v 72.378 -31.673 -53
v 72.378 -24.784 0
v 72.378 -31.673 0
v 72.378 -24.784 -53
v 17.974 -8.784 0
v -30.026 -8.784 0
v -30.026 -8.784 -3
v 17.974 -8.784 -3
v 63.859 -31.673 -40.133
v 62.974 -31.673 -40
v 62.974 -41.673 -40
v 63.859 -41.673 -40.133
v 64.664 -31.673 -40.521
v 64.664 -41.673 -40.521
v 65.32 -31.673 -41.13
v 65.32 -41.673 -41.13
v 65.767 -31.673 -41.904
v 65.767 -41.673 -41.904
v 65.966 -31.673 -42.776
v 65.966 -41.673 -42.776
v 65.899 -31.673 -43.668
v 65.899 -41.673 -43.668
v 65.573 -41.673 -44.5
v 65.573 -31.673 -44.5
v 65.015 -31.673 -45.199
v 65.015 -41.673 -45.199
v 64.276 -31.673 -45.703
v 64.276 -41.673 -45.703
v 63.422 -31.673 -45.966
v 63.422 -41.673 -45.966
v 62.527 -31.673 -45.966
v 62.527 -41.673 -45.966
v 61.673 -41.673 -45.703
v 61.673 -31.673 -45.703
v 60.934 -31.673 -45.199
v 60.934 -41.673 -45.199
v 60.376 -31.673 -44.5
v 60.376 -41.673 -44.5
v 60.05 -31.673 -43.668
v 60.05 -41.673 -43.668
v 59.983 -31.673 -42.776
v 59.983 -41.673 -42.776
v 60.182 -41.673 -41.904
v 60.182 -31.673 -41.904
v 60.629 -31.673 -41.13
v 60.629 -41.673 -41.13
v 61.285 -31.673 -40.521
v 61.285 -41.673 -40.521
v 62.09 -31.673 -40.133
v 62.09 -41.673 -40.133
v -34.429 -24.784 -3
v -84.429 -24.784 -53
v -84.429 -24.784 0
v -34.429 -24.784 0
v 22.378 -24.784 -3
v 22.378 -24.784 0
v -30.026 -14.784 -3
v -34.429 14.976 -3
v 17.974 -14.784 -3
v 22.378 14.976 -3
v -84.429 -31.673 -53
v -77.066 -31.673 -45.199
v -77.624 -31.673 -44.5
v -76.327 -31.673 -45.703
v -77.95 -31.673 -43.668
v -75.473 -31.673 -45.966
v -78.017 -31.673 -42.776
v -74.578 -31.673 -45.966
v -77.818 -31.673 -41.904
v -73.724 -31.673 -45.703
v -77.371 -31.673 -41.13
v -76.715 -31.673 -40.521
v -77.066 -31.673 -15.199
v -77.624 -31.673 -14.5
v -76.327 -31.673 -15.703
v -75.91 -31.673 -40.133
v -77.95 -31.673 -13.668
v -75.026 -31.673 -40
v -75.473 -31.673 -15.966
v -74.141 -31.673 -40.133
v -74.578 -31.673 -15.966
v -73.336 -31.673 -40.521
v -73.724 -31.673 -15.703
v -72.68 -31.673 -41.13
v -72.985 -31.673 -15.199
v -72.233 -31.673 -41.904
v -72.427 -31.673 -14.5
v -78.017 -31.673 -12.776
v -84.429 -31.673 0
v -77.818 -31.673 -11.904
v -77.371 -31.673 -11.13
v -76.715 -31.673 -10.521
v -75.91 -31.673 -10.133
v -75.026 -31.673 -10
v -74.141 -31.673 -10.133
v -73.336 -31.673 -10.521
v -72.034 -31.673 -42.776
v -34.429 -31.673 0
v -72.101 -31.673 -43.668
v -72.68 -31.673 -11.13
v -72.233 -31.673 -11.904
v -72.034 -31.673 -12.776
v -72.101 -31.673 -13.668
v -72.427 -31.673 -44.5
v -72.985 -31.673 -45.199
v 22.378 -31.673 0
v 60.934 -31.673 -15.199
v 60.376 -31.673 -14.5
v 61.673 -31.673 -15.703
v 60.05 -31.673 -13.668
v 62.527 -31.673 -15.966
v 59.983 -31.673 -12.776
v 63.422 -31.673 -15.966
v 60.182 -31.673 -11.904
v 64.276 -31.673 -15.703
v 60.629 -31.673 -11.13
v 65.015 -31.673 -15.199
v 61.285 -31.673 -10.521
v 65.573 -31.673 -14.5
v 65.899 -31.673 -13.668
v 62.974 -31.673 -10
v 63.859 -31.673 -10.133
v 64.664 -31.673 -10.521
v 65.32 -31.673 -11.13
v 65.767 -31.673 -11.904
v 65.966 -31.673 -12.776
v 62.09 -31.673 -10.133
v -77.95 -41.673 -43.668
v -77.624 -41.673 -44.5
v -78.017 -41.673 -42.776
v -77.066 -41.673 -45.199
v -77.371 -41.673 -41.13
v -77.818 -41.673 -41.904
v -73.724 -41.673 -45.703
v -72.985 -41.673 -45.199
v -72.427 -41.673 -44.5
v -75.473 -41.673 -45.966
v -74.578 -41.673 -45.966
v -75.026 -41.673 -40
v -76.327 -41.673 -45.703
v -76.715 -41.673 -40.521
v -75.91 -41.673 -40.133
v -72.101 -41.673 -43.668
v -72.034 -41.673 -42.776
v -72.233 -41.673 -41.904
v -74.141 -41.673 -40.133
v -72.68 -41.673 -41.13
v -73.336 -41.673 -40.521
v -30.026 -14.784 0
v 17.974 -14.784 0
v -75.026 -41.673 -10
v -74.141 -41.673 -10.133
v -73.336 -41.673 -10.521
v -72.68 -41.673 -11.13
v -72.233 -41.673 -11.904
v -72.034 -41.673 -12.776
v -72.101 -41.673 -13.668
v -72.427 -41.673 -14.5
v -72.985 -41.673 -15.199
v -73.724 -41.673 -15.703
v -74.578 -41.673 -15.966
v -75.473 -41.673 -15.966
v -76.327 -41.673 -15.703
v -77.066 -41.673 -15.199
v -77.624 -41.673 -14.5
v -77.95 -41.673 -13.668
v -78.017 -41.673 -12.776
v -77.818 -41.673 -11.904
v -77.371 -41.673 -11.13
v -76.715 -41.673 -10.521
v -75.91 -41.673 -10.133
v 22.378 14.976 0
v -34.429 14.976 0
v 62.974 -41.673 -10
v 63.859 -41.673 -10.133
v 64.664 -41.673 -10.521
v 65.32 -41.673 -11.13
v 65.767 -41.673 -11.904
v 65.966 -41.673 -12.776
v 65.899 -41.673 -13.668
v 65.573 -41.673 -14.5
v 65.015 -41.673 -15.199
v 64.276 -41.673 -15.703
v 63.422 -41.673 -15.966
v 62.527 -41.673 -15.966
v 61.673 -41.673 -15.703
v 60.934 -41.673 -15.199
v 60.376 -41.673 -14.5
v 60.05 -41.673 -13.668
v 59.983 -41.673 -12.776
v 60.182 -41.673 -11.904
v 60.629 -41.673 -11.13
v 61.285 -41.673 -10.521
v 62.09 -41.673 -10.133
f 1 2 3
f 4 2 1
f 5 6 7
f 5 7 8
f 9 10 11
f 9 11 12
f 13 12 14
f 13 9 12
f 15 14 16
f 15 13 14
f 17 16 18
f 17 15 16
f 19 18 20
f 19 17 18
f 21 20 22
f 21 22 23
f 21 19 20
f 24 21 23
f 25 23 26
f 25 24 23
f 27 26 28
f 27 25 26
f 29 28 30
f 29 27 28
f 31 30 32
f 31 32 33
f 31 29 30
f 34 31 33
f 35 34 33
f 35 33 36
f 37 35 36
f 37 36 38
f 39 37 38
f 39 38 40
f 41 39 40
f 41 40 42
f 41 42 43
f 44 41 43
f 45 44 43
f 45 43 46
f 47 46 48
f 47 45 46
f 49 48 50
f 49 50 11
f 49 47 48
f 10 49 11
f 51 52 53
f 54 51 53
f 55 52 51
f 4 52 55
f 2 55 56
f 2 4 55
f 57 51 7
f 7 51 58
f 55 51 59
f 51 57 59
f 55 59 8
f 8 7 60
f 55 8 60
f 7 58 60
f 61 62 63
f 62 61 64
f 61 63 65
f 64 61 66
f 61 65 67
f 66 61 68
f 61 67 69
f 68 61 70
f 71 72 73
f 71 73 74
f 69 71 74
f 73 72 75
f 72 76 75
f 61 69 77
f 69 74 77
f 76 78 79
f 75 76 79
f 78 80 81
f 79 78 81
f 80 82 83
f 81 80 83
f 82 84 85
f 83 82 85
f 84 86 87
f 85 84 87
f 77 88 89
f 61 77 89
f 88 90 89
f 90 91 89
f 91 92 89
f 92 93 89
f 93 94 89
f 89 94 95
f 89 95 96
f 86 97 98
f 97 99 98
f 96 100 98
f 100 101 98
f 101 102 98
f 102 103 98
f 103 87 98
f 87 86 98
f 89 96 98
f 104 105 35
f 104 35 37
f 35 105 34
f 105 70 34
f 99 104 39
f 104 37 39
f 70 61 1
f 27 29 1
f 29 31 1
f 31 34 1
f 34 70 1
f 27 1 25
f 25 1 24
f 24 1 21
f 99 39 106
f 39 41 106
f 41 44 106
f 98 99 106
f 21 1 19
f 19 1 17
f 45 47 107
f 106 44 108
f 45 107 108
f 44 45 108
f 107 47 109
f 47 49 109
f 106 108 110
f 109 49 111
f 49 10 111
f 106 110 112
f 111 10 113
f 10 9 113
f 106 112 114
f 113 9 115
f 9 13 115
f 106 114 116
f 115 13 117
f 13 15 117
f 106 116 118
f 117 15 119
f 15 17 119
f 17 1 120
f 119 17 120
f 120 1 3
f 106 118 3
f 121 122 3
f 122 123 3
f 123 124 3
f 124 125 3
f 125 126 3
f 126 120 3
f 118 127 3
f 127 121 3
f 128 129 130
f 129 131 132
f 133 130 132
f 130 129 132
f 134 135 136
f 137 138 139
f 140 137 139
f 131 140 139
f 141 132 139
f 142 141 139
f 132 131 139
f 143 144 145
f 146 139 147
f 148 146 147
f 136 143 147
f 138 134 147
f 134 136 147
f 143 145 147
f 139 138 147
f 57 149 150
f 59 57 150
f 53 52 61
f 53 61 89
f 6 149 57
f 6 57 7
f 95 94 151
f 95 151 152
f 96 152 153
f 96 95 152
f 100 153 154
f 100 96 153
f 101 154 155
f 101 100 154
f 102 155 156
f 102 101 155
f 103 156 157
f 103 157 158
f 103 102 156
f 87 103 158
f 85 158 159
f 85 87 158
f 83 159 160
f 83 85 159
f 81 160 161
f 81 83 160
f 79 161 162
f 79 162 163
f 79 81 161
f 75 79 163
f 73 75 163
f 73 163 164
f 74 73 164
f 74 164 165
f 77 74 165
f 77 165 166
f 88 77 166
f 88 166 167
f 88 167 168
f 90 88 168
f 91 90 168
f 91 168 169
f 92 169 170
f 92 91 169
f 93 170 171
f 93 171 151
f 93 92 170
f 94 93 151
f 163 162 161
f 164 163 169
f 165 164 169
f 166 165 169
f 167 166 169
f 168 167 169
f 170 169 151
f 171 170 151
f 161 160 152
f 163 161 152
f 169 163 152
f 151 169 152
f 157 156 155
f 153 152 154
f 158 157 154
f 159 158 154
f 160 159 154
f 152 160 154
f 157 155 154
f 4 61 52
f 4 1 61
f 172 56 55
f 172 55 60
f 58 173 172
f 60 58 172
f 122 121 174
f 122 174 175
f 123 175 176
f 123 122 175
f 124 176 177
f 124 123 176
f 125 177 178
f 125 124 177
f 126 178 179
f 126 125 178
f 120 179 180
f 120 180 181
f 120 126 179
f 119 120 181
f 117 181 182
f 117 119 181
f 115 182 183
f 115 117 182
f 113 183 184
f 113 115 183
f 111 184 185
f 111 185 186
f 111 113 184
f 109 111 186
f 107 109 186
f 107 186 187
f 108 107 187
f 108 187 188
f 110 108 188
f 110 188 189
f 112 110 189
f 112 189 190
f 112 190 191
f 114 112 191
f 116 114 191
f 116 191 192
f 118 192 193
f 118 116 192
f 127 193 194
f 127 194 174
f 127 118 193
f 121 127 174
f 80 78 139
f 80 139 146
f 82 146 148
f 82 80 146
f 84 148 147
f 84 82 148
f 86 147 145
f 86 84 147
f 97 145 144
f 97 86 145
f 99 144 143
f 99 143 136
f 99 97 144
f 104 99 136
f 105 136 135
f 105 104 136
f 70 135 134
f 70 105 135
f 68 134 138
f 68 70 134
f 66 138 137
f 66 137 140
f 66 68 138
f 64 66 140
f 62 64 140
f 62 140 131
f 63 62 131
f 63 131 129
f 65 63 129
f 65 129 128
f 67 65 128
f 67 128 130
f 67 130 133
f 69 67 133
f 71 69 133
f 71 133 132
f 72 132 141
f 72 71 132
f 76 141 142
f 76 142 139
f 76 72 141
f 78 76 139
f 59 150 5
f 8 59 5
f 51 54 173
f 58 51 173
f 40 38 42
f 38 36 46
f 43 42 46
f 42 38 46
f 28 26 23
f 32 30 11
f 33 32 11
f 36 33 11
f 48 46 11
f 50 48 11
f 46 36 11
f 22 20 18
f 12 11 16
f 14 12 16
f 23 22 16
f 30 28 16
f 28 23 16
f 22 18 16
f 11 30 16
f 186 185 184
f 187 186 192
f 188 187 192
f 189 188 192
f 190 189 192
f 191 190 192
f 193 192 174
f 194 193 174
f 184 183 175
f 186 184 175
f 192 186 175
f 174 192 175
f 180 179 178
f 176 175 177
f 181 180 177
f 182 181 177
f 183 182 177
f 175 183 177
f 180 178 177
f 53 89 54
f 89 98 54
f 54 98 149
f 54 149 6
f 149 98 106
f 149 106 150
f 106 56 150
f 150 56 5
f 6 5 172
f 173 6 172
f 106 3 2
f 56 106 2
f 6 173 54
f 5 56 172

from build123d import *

# Parameters (mm, degrees)
SKETCH1_W           = 56.807908868
SKETCH1_H           = 54.266272082
BOSS_EXTRUDE2_DEPTH = 3
SKETCH2_R           = 4.25
BOSS_EXTRUDE3_DEPTH = 12
SKETCH3_W           = 48
SKETCH3_H           = 6
CUT_EXTRUDE1_DEPTH  = 10
SKETCH4_W           = 56.807908868
SKETCH4_H           = 6.889223191
BOSS_EXTRUDE4_DEPTH = 50
SKETCH5_W           = 53
SKETCH5_H           = 6.889223191
BOSS_EXTRUDE5_DEPTH = 50
SKETCH8_W           = 53
SKETCH8_H           = 6.889223191
BOSS_EXTRUDE6_DEPTH = 50
SKETCH9_W           = 68.867558101
SKETCH9_H           = 60.331860759
CUT_EXTRUDE2_DEPTH  = 26
SKETCH10_W          = 129.878394785
SKETCH10_H          = 53.736094631
CUT_EXTRUDE3_DEPTH  = 22
BOSS_EXTRUDE7_START = -6.889223
SKETCH11_R          = 3
BOSS_EXTRUDE7_DEPTH = 10


with BuildPart() as part:
    # Sketch1 → Boss-Extrude2 (new body)
    with BuildSketch(Plane.XY):
        with Locations((-6.025526457, -12.157362225)):
            Rectangle(SKETCH1_W, SKETCH1_H)
    extrude(amount=-BOSS_EXTRUDE2_DEPTH)

    # Sketch2 → Boss-Extrude3 (add)
    with BuildSketch(Plane.XY):
        with Locations((-26.141196849, 5.26708344)):
            Circle(SKETCH2_R)
        with Locations((-6.541196849, 5.26708344)):
            Circle(SKETCH2_R)
        with Locations((13.058803151, 5.26708344)):
            Circle(SKETCH2_R)
        with Locations((-26.141196849, -29.58291656)):
            Circle(SKETCH2_R)
        with Locations((-6.541196849, -29.58291656)):
            Circle(SKETCH2_R)
        with Locations((13.058803151, -29.58291656)):
            Circle(SKETCH2_R)
    extrude(amount=BOSS_EXTRUDE3_DEPTH)

    # Sketch3 → Cut-Extrude1 (cut)
    with BuildSketch(Plane.XY):
        with Locations((-6.025526457, -11.783671744)):
            Rectangle(SKETCH3_W, SKETCH3_H)
    extrude(amount=-CUT_EXTRUDE1_DEPTH, mode=Mode.SUBTRACT)

    # Sketch4 → Boss-Extrude4 (add)
    with BuildSketch(Plane(origin=(0, 0, -3), x_dir=(-1, 0, 0), z_dir=(0, 0, -1))):
        with Locations((6.025526457, -28.22828334)):
            Rectangle(SKETCH4_W, SKETCH4_H)
    extrude(amount=BOSS_EXTRUDE4_DEPTH)

    # Sketch5 → Boss-Extrude5 (add)
    with BuildSketch(Plane(origin=(22.378427977, 0, 0), x_dir=(0, 0, -1), z_dir=(1, 0, 0))):
        with Locations((26.5, -28.22828334)):
            Rectangle(SKETCH5_W, SKETCH5_H)
    extrude(amount=BOSS_EXTRUDE5_DEPTH)

    # Sketch8 → Boss-Extrude6 (add)
    with BuildSketch(Plane.ZY.offset(34.429480891)):
        with Locations((-26.5, -28.22828334)):
            Rectangle(SKETCH8_W, SKETCH8_H)
    extrude(amount=BOSS_EXTRUDE6_DEPTH)

    # Sketch9 → Cut-Extrude2 (cut)
    with BuildSketch(Plane.XY):
        with Locations((-7.965457672, -13.030331271)):
            Rectangle(SKETCH9_W, SKETCH9_H)
    extrude(amount=CUT_EXTRUDE2_DEPTH, mode=Mode.SUBTRACT)

    # Sketch10 → Cut-Extrude3 (cut)
    with BuildSketch(Plane.XZ.offset(31.672894935)):
        with Locations((-14.803715202, -13.978089422)):
            Rectangle(SKETCH10_W, SKETCH10_H)
    extrude(amount=CUT_EXTRUDE3_DEPTH, mode=Mode.SUBTRACT)

    # Sketch11 → Boss-Extrude7 (add)
    with BuildSketch(Plane(origin=(0, -24.783671744, 0), x_dir=(1, 0, 0), z_dir=(0, 1, 0)).offset(BOSS_EXTRUDE7_START)):
        with Locations(Location((-75.025526457, 43, 0), (0, 0, 270))):
            Circle(SKETCH11_R)
        with Locations(Location((-75.025526457, 13, 0), (0, 0, 270))):
            Circle(SKETCH11_R)
        with Locations(Location((62.974473543, 13, 0), (0, 0, 270))):
            Circle(SKETCH11_R)
        with Locations(Location((62.974473543, 43, 0), (0, 0, 270))):
            Circle(SKETCH11_R)
    extrude(amount=-BOSS_EXTRUDE7_DEPTH)


solid = part.part
